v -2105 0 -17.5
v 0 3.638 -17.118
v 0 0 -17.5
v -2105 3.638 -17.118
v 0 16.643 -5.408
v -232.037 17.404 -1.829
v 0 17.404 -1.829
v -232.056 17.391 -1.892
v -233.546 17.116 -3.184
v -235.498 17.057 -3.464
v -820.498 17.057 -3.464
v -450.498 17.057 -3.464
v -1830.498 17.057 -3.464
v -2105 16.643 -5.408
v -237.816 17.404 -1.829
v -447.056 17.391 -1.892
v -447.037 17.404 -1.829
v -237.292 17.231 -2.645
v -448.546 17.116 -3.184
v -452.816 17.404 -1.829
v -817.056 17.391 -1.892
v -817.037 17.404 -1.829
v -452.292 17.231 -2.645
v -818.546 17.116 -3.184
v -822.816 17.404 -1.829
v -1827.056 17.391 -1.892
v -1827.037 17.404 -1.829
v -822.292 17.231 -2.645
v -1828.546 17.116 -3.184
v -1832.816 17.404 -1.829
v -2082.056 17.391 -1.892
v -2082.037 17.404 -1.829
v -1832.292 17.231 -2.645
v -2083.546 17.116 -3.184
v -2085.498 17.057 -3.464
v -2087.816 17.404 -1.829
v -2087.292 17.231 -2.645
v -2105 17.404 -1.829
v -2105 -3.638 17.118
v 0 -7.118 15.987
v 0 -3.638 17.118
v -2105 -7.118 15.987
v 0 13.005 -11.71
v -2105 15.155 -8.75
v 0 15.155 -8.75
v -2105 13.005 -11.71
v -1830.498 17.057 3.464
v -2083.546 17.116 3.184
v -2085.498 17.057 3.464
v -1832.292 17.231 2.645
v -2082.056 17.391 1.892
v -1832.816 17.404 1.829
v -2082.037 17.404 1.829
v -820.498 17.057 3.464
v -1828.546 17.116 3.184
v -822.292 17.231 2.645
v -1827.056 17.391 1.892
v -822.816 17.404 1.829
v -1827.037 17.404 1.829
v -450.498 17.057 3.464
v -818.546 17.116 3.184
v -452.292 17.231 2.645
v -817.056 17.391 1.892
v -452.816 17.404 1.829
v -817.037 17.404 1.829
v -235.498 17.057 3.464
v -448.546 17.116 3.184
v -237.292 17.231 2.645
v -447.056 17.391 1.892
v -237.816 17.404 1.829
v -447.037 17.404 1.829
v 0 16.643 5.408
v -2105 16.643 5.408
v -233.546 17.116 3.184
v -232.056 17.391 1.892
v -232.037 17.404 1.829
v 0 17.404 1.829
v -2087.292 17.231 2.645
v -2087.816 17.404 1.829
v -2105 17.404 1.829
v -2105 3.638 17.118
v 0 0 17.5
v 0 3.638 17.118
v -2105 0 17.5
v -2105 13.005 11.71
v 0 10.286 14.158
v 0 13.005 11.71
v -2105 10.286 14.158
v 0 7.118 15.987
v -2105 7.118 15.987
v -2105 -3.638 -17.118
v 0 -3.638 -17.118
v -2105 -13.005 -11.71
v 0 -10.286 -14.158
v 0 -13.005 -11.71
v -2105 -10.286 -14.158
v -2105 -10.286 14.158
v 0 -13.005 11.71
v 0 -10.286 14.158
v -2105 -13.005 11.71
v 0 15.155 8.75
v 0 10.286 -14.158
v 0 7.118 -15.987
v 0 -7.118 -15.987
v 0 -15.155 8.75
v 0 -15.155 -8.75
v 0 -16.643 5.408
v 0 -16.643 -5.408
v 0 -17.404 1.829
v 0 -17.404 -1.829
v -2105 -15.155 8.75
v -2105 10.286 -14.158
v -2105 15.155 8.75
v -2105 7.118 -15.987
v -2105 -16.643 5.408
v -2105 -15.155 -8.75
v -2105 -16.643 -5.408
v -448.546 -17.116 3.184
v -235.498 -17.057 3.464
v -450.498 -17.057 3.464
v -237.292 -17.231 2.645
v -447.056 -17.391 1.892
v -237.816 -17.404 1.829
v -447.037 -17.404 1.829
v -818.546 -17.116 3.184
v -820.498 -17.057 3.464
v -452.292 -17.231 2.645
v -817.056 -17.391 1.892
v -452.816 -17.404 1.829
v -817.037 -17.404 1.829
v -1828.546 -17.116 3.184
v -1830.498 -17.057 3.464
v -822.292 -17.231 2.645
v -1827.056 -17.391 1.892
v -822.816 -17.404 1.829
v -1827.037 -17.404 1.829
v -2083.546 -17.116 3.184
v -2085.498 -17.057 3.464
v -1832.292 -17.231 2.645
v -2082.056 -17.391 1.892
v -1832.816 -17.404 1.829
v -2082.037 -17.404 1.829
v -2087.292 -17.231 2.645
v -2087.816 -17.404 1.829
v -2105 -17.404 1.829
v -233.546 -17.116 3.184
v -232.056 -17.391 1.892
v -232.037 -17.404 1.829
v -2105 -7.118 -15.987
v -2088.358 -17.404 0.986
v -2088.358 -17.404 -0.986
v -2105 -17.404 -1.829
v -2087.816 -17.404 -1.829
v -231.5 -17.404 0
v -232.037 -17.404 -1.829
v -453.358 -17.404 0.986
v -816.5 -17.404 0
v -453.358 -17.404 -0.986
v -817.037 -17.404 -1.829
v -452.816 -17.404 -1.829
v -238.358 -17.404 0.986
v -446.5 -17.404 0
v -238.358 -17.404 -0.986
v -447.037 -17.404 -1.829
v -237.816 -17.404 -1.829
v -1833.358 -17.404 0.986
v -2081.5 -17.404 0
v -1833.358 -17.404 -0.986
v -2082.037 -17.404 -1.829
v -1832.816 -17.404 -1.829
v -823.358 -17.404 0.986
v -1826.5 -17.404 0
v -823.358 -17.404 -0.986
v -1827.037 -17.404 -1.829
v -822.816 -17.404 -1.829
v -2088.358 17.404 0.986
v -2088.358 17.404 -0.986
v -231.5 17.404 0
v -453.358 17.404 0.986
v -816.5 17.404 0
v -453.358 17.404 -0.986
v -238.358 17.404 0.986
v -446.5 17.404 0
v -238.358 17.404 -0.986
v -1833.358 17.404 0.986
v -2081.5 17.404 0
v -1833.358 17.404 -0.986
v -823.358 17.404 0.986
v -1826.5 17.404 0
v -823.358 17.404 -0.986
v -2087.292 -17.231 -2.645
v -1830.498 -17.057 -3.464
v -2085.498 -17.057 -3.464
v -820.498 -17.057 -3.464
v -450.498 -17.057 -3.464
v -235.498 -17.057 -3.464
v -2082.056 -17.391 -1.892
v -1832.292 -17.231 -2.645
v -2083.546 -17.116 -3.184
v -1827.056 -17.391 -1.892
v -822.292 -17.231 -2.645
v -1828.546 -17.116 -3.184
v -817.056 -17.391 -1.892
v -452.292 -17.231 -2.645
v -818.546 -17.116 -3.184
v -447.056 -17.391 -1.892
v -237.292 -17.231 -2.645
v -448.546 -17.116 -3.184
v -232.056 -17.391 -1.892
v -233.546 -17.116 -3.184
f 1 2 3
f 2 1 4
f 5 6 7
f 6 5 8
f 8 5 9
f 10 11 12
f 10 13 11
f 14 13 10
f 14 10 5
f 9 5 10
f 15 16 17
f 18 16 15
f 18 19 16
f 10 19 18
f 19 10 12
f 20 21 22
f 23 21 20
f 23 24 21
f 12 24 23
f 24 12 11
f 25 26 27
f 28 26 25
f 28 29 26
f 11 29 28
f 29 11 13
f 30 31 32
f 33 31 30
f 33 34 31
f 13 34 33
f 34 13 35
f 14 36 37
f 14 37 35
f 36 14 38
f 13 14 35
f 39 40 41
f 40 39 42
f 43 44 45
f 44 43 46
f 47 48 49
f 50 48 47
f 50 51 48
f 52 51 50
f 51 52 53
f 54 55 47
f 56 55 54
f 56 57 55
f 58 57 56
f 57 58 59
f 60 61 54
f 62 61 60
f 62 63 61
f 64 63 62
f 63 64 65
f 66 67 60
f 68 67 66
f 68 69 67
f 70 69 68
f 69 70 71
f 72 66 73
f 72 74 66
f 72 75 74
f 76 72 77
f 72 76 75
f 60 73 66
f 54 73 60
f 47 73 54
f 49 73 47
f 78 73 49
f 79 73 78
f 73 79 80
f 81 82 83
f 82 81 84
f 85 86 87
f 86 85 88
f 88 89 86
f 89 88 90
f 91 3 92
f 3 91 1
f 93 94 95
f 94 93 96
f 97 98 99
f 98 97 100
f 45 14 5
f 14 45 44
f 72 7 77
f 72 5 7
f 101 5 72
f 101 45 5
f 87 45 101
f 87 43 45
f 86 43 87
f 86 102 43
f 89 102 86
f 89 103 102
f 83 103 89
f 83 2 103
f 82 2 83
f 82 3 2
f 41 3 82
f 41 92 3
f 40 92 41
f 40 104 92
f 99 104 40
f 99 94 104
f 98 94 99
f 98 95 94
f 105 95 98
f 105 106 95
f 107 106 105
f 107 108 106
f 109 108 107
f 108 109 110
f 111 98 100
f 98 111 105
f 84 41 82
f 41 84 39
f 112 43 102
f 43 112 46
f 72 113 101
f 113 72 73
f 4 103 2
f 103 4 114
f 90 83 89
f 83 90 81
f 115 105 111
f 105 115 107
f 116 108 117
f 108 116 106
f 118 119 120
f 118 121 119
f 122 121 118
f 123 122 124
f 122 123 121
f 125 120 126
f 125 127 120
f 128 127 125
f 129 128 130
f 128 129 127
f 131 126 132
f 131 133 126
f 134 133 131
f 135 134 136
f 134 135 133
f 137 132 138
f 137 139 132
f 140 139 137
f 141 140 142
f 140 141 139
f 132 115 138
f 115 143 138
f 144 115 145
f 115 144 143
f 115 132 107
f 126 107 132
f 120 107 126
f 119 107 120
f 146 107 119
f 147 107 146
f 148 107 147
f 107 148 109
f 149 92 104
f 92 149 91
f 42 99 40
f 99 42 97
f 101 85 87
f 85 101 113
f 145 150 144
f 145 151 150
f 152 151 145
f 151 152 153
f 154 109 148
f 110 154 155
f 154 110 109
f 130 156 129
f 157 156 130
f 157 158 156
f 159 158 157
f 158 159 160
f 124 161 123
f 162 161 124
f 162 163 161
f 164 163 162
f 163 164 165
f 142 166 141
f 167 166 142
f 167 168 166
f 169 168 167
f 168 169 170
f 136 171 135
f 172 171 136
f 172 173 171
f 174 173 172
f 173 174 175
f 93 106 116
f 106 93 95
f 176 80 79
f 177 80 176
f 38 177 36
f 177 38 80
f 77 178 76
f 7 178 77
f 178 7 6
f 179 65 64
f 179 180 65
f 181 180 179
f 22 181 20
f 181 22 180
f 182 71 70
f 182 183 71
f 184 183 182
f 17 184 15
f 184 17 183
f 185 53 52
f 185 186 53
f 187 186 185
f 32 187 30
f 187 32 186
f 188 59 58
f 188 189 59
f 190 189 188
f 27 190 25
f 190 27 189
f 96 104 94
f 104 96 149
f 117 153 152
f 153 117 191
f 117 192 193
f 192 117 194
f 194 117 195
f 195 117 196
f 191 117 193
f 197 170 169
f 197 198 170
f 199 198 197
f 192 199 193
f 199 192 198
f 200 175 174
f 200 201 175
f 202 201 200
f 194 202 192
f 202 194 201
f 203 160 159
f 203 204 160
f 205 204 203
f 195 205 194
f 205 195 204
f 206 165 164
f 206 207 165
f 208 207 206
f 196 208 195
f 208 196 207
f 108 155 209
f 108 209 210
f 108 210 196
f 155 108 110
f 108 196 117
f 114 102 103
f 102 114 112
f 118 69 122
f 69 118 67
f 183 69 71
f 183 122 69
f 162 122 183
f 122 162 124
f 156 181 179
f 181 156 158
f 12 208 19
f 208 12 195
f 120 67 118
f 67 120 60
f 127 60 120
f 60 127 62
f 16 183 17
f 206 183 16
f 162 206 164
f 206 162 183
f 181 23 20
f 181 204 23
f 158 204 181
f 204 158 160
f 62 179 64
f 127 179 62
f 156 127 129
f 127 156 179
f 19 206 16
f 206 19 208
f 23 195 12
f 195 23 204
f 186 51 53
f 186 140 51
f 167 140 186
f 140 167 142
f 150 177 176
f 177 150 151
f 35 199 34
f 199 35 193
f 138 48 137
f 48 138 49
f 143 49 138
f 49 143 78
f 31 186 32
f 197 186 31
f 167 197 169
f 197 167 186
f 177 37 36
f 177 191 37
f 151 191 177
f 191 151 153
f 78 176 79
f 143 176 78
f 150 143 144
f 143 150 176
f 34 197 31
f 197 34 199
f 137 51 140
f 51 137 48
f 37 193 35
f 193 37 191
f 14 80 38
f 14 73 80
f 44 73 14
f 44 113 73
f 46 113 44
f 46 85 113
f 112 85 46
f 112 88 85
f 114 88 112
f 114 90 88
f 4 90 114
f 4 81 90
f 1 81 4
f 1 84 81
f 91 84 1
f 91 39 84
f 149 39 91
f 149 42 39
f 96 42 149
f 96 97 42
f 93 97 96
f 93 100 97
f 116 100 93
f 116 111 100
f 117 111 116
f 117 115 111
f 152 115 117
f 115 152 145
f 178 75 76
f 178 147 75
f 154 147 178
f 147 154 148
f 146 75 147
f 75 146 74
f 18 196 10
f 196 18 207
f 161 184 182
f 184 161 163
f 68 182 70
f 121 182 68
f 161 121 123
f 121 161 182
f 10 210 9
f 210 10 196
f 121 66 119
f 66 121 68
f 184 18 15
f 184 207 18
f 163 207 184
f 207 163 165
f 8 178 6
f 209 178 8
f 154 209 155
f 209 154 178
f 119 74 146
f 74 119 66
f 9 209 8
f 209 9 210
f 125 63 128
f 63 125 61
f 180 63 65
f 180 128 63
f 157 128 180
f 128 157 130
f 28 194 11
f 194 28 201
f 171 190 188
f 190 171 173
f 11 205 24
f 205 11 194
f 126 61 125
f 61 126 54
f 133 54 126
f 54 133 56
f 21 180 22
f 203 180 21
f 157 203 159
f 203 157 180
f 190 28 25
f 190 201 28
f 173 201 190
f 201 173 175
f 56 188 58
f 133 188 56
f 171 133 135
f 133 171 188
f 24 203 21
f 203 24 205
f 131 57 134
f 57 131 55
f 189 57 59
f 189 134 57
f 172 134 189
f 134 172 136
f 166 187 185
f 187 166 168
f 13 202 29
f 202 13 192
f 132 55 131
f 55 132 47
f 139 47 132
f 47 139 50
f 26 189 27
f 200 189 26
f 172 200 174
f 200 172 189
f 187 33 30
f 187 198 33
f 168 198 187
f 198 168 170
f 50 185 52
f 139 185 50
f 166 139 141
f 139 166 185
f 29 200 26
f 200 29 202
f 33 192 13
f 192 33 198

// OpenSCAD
// file: el_StringerZadVnesh.scad
StringerZadVnesh();

stringerR = 35/2;
length = 2100;
probkaThk = 5;
shpHoleR = 7/2;
//b1 = 15;
//b2 = 435;
b3 = 450;
b4 = 2100 - 15;

module StringerZadVnesh() {

    color([1,0,0]) 
    translate([-length,0,0])
    rotate([0,-90,0]) 
    cylinder(h=probkaThk, r=stringerR);

    difference() {

        rotate([0,-90,0]) 
        cylinder(h=length, r=stringerR);

        translate([-b3,0,0])
        rotate([90,0,0]) 
        cylinder(h=2*stringerR+2,r=shpHoleR, center=true);

        translate([-b4,0,0]) 
        rotate([90,0,0]) 
        cylinder(h=2*stringerR+2,r=shpHoleR, center=true);

    }
}
// main file
use <el_StringerZadVnesh.scad>;

StringerZadVnutr();

stringerR = 35/2;
length = 2100;
probkaThk = 5;
shpHoleR = 7/2;
//b1 = 15;
//b2 = 435;
//b3 = 450;
//b4 = 2100 - 15;
doskaHole =235;
podShvHole=450+370;
rudderHole=450+370+1010;



module StringerZadVnutr() {


    difference() {

        StringerZadVnesh();

        translate([-doskaHole,0,0])
        rotate([90,0,0]) 
        cylinder(h=2*stringerR+2,r=shpHoleR, center=true);

        translate([-podShvHole,0,0]) 
        rotate([90,0,0]) 
        cylinder(h=2*stringerR+2,r=shpHoleR, center=true);

        translate([-rudderHole,0,0]) 
        rotate([90,0,0]) 
        cylinder(h=2*stringerR+2,r=shpHoleR, center=true);

    }
}
